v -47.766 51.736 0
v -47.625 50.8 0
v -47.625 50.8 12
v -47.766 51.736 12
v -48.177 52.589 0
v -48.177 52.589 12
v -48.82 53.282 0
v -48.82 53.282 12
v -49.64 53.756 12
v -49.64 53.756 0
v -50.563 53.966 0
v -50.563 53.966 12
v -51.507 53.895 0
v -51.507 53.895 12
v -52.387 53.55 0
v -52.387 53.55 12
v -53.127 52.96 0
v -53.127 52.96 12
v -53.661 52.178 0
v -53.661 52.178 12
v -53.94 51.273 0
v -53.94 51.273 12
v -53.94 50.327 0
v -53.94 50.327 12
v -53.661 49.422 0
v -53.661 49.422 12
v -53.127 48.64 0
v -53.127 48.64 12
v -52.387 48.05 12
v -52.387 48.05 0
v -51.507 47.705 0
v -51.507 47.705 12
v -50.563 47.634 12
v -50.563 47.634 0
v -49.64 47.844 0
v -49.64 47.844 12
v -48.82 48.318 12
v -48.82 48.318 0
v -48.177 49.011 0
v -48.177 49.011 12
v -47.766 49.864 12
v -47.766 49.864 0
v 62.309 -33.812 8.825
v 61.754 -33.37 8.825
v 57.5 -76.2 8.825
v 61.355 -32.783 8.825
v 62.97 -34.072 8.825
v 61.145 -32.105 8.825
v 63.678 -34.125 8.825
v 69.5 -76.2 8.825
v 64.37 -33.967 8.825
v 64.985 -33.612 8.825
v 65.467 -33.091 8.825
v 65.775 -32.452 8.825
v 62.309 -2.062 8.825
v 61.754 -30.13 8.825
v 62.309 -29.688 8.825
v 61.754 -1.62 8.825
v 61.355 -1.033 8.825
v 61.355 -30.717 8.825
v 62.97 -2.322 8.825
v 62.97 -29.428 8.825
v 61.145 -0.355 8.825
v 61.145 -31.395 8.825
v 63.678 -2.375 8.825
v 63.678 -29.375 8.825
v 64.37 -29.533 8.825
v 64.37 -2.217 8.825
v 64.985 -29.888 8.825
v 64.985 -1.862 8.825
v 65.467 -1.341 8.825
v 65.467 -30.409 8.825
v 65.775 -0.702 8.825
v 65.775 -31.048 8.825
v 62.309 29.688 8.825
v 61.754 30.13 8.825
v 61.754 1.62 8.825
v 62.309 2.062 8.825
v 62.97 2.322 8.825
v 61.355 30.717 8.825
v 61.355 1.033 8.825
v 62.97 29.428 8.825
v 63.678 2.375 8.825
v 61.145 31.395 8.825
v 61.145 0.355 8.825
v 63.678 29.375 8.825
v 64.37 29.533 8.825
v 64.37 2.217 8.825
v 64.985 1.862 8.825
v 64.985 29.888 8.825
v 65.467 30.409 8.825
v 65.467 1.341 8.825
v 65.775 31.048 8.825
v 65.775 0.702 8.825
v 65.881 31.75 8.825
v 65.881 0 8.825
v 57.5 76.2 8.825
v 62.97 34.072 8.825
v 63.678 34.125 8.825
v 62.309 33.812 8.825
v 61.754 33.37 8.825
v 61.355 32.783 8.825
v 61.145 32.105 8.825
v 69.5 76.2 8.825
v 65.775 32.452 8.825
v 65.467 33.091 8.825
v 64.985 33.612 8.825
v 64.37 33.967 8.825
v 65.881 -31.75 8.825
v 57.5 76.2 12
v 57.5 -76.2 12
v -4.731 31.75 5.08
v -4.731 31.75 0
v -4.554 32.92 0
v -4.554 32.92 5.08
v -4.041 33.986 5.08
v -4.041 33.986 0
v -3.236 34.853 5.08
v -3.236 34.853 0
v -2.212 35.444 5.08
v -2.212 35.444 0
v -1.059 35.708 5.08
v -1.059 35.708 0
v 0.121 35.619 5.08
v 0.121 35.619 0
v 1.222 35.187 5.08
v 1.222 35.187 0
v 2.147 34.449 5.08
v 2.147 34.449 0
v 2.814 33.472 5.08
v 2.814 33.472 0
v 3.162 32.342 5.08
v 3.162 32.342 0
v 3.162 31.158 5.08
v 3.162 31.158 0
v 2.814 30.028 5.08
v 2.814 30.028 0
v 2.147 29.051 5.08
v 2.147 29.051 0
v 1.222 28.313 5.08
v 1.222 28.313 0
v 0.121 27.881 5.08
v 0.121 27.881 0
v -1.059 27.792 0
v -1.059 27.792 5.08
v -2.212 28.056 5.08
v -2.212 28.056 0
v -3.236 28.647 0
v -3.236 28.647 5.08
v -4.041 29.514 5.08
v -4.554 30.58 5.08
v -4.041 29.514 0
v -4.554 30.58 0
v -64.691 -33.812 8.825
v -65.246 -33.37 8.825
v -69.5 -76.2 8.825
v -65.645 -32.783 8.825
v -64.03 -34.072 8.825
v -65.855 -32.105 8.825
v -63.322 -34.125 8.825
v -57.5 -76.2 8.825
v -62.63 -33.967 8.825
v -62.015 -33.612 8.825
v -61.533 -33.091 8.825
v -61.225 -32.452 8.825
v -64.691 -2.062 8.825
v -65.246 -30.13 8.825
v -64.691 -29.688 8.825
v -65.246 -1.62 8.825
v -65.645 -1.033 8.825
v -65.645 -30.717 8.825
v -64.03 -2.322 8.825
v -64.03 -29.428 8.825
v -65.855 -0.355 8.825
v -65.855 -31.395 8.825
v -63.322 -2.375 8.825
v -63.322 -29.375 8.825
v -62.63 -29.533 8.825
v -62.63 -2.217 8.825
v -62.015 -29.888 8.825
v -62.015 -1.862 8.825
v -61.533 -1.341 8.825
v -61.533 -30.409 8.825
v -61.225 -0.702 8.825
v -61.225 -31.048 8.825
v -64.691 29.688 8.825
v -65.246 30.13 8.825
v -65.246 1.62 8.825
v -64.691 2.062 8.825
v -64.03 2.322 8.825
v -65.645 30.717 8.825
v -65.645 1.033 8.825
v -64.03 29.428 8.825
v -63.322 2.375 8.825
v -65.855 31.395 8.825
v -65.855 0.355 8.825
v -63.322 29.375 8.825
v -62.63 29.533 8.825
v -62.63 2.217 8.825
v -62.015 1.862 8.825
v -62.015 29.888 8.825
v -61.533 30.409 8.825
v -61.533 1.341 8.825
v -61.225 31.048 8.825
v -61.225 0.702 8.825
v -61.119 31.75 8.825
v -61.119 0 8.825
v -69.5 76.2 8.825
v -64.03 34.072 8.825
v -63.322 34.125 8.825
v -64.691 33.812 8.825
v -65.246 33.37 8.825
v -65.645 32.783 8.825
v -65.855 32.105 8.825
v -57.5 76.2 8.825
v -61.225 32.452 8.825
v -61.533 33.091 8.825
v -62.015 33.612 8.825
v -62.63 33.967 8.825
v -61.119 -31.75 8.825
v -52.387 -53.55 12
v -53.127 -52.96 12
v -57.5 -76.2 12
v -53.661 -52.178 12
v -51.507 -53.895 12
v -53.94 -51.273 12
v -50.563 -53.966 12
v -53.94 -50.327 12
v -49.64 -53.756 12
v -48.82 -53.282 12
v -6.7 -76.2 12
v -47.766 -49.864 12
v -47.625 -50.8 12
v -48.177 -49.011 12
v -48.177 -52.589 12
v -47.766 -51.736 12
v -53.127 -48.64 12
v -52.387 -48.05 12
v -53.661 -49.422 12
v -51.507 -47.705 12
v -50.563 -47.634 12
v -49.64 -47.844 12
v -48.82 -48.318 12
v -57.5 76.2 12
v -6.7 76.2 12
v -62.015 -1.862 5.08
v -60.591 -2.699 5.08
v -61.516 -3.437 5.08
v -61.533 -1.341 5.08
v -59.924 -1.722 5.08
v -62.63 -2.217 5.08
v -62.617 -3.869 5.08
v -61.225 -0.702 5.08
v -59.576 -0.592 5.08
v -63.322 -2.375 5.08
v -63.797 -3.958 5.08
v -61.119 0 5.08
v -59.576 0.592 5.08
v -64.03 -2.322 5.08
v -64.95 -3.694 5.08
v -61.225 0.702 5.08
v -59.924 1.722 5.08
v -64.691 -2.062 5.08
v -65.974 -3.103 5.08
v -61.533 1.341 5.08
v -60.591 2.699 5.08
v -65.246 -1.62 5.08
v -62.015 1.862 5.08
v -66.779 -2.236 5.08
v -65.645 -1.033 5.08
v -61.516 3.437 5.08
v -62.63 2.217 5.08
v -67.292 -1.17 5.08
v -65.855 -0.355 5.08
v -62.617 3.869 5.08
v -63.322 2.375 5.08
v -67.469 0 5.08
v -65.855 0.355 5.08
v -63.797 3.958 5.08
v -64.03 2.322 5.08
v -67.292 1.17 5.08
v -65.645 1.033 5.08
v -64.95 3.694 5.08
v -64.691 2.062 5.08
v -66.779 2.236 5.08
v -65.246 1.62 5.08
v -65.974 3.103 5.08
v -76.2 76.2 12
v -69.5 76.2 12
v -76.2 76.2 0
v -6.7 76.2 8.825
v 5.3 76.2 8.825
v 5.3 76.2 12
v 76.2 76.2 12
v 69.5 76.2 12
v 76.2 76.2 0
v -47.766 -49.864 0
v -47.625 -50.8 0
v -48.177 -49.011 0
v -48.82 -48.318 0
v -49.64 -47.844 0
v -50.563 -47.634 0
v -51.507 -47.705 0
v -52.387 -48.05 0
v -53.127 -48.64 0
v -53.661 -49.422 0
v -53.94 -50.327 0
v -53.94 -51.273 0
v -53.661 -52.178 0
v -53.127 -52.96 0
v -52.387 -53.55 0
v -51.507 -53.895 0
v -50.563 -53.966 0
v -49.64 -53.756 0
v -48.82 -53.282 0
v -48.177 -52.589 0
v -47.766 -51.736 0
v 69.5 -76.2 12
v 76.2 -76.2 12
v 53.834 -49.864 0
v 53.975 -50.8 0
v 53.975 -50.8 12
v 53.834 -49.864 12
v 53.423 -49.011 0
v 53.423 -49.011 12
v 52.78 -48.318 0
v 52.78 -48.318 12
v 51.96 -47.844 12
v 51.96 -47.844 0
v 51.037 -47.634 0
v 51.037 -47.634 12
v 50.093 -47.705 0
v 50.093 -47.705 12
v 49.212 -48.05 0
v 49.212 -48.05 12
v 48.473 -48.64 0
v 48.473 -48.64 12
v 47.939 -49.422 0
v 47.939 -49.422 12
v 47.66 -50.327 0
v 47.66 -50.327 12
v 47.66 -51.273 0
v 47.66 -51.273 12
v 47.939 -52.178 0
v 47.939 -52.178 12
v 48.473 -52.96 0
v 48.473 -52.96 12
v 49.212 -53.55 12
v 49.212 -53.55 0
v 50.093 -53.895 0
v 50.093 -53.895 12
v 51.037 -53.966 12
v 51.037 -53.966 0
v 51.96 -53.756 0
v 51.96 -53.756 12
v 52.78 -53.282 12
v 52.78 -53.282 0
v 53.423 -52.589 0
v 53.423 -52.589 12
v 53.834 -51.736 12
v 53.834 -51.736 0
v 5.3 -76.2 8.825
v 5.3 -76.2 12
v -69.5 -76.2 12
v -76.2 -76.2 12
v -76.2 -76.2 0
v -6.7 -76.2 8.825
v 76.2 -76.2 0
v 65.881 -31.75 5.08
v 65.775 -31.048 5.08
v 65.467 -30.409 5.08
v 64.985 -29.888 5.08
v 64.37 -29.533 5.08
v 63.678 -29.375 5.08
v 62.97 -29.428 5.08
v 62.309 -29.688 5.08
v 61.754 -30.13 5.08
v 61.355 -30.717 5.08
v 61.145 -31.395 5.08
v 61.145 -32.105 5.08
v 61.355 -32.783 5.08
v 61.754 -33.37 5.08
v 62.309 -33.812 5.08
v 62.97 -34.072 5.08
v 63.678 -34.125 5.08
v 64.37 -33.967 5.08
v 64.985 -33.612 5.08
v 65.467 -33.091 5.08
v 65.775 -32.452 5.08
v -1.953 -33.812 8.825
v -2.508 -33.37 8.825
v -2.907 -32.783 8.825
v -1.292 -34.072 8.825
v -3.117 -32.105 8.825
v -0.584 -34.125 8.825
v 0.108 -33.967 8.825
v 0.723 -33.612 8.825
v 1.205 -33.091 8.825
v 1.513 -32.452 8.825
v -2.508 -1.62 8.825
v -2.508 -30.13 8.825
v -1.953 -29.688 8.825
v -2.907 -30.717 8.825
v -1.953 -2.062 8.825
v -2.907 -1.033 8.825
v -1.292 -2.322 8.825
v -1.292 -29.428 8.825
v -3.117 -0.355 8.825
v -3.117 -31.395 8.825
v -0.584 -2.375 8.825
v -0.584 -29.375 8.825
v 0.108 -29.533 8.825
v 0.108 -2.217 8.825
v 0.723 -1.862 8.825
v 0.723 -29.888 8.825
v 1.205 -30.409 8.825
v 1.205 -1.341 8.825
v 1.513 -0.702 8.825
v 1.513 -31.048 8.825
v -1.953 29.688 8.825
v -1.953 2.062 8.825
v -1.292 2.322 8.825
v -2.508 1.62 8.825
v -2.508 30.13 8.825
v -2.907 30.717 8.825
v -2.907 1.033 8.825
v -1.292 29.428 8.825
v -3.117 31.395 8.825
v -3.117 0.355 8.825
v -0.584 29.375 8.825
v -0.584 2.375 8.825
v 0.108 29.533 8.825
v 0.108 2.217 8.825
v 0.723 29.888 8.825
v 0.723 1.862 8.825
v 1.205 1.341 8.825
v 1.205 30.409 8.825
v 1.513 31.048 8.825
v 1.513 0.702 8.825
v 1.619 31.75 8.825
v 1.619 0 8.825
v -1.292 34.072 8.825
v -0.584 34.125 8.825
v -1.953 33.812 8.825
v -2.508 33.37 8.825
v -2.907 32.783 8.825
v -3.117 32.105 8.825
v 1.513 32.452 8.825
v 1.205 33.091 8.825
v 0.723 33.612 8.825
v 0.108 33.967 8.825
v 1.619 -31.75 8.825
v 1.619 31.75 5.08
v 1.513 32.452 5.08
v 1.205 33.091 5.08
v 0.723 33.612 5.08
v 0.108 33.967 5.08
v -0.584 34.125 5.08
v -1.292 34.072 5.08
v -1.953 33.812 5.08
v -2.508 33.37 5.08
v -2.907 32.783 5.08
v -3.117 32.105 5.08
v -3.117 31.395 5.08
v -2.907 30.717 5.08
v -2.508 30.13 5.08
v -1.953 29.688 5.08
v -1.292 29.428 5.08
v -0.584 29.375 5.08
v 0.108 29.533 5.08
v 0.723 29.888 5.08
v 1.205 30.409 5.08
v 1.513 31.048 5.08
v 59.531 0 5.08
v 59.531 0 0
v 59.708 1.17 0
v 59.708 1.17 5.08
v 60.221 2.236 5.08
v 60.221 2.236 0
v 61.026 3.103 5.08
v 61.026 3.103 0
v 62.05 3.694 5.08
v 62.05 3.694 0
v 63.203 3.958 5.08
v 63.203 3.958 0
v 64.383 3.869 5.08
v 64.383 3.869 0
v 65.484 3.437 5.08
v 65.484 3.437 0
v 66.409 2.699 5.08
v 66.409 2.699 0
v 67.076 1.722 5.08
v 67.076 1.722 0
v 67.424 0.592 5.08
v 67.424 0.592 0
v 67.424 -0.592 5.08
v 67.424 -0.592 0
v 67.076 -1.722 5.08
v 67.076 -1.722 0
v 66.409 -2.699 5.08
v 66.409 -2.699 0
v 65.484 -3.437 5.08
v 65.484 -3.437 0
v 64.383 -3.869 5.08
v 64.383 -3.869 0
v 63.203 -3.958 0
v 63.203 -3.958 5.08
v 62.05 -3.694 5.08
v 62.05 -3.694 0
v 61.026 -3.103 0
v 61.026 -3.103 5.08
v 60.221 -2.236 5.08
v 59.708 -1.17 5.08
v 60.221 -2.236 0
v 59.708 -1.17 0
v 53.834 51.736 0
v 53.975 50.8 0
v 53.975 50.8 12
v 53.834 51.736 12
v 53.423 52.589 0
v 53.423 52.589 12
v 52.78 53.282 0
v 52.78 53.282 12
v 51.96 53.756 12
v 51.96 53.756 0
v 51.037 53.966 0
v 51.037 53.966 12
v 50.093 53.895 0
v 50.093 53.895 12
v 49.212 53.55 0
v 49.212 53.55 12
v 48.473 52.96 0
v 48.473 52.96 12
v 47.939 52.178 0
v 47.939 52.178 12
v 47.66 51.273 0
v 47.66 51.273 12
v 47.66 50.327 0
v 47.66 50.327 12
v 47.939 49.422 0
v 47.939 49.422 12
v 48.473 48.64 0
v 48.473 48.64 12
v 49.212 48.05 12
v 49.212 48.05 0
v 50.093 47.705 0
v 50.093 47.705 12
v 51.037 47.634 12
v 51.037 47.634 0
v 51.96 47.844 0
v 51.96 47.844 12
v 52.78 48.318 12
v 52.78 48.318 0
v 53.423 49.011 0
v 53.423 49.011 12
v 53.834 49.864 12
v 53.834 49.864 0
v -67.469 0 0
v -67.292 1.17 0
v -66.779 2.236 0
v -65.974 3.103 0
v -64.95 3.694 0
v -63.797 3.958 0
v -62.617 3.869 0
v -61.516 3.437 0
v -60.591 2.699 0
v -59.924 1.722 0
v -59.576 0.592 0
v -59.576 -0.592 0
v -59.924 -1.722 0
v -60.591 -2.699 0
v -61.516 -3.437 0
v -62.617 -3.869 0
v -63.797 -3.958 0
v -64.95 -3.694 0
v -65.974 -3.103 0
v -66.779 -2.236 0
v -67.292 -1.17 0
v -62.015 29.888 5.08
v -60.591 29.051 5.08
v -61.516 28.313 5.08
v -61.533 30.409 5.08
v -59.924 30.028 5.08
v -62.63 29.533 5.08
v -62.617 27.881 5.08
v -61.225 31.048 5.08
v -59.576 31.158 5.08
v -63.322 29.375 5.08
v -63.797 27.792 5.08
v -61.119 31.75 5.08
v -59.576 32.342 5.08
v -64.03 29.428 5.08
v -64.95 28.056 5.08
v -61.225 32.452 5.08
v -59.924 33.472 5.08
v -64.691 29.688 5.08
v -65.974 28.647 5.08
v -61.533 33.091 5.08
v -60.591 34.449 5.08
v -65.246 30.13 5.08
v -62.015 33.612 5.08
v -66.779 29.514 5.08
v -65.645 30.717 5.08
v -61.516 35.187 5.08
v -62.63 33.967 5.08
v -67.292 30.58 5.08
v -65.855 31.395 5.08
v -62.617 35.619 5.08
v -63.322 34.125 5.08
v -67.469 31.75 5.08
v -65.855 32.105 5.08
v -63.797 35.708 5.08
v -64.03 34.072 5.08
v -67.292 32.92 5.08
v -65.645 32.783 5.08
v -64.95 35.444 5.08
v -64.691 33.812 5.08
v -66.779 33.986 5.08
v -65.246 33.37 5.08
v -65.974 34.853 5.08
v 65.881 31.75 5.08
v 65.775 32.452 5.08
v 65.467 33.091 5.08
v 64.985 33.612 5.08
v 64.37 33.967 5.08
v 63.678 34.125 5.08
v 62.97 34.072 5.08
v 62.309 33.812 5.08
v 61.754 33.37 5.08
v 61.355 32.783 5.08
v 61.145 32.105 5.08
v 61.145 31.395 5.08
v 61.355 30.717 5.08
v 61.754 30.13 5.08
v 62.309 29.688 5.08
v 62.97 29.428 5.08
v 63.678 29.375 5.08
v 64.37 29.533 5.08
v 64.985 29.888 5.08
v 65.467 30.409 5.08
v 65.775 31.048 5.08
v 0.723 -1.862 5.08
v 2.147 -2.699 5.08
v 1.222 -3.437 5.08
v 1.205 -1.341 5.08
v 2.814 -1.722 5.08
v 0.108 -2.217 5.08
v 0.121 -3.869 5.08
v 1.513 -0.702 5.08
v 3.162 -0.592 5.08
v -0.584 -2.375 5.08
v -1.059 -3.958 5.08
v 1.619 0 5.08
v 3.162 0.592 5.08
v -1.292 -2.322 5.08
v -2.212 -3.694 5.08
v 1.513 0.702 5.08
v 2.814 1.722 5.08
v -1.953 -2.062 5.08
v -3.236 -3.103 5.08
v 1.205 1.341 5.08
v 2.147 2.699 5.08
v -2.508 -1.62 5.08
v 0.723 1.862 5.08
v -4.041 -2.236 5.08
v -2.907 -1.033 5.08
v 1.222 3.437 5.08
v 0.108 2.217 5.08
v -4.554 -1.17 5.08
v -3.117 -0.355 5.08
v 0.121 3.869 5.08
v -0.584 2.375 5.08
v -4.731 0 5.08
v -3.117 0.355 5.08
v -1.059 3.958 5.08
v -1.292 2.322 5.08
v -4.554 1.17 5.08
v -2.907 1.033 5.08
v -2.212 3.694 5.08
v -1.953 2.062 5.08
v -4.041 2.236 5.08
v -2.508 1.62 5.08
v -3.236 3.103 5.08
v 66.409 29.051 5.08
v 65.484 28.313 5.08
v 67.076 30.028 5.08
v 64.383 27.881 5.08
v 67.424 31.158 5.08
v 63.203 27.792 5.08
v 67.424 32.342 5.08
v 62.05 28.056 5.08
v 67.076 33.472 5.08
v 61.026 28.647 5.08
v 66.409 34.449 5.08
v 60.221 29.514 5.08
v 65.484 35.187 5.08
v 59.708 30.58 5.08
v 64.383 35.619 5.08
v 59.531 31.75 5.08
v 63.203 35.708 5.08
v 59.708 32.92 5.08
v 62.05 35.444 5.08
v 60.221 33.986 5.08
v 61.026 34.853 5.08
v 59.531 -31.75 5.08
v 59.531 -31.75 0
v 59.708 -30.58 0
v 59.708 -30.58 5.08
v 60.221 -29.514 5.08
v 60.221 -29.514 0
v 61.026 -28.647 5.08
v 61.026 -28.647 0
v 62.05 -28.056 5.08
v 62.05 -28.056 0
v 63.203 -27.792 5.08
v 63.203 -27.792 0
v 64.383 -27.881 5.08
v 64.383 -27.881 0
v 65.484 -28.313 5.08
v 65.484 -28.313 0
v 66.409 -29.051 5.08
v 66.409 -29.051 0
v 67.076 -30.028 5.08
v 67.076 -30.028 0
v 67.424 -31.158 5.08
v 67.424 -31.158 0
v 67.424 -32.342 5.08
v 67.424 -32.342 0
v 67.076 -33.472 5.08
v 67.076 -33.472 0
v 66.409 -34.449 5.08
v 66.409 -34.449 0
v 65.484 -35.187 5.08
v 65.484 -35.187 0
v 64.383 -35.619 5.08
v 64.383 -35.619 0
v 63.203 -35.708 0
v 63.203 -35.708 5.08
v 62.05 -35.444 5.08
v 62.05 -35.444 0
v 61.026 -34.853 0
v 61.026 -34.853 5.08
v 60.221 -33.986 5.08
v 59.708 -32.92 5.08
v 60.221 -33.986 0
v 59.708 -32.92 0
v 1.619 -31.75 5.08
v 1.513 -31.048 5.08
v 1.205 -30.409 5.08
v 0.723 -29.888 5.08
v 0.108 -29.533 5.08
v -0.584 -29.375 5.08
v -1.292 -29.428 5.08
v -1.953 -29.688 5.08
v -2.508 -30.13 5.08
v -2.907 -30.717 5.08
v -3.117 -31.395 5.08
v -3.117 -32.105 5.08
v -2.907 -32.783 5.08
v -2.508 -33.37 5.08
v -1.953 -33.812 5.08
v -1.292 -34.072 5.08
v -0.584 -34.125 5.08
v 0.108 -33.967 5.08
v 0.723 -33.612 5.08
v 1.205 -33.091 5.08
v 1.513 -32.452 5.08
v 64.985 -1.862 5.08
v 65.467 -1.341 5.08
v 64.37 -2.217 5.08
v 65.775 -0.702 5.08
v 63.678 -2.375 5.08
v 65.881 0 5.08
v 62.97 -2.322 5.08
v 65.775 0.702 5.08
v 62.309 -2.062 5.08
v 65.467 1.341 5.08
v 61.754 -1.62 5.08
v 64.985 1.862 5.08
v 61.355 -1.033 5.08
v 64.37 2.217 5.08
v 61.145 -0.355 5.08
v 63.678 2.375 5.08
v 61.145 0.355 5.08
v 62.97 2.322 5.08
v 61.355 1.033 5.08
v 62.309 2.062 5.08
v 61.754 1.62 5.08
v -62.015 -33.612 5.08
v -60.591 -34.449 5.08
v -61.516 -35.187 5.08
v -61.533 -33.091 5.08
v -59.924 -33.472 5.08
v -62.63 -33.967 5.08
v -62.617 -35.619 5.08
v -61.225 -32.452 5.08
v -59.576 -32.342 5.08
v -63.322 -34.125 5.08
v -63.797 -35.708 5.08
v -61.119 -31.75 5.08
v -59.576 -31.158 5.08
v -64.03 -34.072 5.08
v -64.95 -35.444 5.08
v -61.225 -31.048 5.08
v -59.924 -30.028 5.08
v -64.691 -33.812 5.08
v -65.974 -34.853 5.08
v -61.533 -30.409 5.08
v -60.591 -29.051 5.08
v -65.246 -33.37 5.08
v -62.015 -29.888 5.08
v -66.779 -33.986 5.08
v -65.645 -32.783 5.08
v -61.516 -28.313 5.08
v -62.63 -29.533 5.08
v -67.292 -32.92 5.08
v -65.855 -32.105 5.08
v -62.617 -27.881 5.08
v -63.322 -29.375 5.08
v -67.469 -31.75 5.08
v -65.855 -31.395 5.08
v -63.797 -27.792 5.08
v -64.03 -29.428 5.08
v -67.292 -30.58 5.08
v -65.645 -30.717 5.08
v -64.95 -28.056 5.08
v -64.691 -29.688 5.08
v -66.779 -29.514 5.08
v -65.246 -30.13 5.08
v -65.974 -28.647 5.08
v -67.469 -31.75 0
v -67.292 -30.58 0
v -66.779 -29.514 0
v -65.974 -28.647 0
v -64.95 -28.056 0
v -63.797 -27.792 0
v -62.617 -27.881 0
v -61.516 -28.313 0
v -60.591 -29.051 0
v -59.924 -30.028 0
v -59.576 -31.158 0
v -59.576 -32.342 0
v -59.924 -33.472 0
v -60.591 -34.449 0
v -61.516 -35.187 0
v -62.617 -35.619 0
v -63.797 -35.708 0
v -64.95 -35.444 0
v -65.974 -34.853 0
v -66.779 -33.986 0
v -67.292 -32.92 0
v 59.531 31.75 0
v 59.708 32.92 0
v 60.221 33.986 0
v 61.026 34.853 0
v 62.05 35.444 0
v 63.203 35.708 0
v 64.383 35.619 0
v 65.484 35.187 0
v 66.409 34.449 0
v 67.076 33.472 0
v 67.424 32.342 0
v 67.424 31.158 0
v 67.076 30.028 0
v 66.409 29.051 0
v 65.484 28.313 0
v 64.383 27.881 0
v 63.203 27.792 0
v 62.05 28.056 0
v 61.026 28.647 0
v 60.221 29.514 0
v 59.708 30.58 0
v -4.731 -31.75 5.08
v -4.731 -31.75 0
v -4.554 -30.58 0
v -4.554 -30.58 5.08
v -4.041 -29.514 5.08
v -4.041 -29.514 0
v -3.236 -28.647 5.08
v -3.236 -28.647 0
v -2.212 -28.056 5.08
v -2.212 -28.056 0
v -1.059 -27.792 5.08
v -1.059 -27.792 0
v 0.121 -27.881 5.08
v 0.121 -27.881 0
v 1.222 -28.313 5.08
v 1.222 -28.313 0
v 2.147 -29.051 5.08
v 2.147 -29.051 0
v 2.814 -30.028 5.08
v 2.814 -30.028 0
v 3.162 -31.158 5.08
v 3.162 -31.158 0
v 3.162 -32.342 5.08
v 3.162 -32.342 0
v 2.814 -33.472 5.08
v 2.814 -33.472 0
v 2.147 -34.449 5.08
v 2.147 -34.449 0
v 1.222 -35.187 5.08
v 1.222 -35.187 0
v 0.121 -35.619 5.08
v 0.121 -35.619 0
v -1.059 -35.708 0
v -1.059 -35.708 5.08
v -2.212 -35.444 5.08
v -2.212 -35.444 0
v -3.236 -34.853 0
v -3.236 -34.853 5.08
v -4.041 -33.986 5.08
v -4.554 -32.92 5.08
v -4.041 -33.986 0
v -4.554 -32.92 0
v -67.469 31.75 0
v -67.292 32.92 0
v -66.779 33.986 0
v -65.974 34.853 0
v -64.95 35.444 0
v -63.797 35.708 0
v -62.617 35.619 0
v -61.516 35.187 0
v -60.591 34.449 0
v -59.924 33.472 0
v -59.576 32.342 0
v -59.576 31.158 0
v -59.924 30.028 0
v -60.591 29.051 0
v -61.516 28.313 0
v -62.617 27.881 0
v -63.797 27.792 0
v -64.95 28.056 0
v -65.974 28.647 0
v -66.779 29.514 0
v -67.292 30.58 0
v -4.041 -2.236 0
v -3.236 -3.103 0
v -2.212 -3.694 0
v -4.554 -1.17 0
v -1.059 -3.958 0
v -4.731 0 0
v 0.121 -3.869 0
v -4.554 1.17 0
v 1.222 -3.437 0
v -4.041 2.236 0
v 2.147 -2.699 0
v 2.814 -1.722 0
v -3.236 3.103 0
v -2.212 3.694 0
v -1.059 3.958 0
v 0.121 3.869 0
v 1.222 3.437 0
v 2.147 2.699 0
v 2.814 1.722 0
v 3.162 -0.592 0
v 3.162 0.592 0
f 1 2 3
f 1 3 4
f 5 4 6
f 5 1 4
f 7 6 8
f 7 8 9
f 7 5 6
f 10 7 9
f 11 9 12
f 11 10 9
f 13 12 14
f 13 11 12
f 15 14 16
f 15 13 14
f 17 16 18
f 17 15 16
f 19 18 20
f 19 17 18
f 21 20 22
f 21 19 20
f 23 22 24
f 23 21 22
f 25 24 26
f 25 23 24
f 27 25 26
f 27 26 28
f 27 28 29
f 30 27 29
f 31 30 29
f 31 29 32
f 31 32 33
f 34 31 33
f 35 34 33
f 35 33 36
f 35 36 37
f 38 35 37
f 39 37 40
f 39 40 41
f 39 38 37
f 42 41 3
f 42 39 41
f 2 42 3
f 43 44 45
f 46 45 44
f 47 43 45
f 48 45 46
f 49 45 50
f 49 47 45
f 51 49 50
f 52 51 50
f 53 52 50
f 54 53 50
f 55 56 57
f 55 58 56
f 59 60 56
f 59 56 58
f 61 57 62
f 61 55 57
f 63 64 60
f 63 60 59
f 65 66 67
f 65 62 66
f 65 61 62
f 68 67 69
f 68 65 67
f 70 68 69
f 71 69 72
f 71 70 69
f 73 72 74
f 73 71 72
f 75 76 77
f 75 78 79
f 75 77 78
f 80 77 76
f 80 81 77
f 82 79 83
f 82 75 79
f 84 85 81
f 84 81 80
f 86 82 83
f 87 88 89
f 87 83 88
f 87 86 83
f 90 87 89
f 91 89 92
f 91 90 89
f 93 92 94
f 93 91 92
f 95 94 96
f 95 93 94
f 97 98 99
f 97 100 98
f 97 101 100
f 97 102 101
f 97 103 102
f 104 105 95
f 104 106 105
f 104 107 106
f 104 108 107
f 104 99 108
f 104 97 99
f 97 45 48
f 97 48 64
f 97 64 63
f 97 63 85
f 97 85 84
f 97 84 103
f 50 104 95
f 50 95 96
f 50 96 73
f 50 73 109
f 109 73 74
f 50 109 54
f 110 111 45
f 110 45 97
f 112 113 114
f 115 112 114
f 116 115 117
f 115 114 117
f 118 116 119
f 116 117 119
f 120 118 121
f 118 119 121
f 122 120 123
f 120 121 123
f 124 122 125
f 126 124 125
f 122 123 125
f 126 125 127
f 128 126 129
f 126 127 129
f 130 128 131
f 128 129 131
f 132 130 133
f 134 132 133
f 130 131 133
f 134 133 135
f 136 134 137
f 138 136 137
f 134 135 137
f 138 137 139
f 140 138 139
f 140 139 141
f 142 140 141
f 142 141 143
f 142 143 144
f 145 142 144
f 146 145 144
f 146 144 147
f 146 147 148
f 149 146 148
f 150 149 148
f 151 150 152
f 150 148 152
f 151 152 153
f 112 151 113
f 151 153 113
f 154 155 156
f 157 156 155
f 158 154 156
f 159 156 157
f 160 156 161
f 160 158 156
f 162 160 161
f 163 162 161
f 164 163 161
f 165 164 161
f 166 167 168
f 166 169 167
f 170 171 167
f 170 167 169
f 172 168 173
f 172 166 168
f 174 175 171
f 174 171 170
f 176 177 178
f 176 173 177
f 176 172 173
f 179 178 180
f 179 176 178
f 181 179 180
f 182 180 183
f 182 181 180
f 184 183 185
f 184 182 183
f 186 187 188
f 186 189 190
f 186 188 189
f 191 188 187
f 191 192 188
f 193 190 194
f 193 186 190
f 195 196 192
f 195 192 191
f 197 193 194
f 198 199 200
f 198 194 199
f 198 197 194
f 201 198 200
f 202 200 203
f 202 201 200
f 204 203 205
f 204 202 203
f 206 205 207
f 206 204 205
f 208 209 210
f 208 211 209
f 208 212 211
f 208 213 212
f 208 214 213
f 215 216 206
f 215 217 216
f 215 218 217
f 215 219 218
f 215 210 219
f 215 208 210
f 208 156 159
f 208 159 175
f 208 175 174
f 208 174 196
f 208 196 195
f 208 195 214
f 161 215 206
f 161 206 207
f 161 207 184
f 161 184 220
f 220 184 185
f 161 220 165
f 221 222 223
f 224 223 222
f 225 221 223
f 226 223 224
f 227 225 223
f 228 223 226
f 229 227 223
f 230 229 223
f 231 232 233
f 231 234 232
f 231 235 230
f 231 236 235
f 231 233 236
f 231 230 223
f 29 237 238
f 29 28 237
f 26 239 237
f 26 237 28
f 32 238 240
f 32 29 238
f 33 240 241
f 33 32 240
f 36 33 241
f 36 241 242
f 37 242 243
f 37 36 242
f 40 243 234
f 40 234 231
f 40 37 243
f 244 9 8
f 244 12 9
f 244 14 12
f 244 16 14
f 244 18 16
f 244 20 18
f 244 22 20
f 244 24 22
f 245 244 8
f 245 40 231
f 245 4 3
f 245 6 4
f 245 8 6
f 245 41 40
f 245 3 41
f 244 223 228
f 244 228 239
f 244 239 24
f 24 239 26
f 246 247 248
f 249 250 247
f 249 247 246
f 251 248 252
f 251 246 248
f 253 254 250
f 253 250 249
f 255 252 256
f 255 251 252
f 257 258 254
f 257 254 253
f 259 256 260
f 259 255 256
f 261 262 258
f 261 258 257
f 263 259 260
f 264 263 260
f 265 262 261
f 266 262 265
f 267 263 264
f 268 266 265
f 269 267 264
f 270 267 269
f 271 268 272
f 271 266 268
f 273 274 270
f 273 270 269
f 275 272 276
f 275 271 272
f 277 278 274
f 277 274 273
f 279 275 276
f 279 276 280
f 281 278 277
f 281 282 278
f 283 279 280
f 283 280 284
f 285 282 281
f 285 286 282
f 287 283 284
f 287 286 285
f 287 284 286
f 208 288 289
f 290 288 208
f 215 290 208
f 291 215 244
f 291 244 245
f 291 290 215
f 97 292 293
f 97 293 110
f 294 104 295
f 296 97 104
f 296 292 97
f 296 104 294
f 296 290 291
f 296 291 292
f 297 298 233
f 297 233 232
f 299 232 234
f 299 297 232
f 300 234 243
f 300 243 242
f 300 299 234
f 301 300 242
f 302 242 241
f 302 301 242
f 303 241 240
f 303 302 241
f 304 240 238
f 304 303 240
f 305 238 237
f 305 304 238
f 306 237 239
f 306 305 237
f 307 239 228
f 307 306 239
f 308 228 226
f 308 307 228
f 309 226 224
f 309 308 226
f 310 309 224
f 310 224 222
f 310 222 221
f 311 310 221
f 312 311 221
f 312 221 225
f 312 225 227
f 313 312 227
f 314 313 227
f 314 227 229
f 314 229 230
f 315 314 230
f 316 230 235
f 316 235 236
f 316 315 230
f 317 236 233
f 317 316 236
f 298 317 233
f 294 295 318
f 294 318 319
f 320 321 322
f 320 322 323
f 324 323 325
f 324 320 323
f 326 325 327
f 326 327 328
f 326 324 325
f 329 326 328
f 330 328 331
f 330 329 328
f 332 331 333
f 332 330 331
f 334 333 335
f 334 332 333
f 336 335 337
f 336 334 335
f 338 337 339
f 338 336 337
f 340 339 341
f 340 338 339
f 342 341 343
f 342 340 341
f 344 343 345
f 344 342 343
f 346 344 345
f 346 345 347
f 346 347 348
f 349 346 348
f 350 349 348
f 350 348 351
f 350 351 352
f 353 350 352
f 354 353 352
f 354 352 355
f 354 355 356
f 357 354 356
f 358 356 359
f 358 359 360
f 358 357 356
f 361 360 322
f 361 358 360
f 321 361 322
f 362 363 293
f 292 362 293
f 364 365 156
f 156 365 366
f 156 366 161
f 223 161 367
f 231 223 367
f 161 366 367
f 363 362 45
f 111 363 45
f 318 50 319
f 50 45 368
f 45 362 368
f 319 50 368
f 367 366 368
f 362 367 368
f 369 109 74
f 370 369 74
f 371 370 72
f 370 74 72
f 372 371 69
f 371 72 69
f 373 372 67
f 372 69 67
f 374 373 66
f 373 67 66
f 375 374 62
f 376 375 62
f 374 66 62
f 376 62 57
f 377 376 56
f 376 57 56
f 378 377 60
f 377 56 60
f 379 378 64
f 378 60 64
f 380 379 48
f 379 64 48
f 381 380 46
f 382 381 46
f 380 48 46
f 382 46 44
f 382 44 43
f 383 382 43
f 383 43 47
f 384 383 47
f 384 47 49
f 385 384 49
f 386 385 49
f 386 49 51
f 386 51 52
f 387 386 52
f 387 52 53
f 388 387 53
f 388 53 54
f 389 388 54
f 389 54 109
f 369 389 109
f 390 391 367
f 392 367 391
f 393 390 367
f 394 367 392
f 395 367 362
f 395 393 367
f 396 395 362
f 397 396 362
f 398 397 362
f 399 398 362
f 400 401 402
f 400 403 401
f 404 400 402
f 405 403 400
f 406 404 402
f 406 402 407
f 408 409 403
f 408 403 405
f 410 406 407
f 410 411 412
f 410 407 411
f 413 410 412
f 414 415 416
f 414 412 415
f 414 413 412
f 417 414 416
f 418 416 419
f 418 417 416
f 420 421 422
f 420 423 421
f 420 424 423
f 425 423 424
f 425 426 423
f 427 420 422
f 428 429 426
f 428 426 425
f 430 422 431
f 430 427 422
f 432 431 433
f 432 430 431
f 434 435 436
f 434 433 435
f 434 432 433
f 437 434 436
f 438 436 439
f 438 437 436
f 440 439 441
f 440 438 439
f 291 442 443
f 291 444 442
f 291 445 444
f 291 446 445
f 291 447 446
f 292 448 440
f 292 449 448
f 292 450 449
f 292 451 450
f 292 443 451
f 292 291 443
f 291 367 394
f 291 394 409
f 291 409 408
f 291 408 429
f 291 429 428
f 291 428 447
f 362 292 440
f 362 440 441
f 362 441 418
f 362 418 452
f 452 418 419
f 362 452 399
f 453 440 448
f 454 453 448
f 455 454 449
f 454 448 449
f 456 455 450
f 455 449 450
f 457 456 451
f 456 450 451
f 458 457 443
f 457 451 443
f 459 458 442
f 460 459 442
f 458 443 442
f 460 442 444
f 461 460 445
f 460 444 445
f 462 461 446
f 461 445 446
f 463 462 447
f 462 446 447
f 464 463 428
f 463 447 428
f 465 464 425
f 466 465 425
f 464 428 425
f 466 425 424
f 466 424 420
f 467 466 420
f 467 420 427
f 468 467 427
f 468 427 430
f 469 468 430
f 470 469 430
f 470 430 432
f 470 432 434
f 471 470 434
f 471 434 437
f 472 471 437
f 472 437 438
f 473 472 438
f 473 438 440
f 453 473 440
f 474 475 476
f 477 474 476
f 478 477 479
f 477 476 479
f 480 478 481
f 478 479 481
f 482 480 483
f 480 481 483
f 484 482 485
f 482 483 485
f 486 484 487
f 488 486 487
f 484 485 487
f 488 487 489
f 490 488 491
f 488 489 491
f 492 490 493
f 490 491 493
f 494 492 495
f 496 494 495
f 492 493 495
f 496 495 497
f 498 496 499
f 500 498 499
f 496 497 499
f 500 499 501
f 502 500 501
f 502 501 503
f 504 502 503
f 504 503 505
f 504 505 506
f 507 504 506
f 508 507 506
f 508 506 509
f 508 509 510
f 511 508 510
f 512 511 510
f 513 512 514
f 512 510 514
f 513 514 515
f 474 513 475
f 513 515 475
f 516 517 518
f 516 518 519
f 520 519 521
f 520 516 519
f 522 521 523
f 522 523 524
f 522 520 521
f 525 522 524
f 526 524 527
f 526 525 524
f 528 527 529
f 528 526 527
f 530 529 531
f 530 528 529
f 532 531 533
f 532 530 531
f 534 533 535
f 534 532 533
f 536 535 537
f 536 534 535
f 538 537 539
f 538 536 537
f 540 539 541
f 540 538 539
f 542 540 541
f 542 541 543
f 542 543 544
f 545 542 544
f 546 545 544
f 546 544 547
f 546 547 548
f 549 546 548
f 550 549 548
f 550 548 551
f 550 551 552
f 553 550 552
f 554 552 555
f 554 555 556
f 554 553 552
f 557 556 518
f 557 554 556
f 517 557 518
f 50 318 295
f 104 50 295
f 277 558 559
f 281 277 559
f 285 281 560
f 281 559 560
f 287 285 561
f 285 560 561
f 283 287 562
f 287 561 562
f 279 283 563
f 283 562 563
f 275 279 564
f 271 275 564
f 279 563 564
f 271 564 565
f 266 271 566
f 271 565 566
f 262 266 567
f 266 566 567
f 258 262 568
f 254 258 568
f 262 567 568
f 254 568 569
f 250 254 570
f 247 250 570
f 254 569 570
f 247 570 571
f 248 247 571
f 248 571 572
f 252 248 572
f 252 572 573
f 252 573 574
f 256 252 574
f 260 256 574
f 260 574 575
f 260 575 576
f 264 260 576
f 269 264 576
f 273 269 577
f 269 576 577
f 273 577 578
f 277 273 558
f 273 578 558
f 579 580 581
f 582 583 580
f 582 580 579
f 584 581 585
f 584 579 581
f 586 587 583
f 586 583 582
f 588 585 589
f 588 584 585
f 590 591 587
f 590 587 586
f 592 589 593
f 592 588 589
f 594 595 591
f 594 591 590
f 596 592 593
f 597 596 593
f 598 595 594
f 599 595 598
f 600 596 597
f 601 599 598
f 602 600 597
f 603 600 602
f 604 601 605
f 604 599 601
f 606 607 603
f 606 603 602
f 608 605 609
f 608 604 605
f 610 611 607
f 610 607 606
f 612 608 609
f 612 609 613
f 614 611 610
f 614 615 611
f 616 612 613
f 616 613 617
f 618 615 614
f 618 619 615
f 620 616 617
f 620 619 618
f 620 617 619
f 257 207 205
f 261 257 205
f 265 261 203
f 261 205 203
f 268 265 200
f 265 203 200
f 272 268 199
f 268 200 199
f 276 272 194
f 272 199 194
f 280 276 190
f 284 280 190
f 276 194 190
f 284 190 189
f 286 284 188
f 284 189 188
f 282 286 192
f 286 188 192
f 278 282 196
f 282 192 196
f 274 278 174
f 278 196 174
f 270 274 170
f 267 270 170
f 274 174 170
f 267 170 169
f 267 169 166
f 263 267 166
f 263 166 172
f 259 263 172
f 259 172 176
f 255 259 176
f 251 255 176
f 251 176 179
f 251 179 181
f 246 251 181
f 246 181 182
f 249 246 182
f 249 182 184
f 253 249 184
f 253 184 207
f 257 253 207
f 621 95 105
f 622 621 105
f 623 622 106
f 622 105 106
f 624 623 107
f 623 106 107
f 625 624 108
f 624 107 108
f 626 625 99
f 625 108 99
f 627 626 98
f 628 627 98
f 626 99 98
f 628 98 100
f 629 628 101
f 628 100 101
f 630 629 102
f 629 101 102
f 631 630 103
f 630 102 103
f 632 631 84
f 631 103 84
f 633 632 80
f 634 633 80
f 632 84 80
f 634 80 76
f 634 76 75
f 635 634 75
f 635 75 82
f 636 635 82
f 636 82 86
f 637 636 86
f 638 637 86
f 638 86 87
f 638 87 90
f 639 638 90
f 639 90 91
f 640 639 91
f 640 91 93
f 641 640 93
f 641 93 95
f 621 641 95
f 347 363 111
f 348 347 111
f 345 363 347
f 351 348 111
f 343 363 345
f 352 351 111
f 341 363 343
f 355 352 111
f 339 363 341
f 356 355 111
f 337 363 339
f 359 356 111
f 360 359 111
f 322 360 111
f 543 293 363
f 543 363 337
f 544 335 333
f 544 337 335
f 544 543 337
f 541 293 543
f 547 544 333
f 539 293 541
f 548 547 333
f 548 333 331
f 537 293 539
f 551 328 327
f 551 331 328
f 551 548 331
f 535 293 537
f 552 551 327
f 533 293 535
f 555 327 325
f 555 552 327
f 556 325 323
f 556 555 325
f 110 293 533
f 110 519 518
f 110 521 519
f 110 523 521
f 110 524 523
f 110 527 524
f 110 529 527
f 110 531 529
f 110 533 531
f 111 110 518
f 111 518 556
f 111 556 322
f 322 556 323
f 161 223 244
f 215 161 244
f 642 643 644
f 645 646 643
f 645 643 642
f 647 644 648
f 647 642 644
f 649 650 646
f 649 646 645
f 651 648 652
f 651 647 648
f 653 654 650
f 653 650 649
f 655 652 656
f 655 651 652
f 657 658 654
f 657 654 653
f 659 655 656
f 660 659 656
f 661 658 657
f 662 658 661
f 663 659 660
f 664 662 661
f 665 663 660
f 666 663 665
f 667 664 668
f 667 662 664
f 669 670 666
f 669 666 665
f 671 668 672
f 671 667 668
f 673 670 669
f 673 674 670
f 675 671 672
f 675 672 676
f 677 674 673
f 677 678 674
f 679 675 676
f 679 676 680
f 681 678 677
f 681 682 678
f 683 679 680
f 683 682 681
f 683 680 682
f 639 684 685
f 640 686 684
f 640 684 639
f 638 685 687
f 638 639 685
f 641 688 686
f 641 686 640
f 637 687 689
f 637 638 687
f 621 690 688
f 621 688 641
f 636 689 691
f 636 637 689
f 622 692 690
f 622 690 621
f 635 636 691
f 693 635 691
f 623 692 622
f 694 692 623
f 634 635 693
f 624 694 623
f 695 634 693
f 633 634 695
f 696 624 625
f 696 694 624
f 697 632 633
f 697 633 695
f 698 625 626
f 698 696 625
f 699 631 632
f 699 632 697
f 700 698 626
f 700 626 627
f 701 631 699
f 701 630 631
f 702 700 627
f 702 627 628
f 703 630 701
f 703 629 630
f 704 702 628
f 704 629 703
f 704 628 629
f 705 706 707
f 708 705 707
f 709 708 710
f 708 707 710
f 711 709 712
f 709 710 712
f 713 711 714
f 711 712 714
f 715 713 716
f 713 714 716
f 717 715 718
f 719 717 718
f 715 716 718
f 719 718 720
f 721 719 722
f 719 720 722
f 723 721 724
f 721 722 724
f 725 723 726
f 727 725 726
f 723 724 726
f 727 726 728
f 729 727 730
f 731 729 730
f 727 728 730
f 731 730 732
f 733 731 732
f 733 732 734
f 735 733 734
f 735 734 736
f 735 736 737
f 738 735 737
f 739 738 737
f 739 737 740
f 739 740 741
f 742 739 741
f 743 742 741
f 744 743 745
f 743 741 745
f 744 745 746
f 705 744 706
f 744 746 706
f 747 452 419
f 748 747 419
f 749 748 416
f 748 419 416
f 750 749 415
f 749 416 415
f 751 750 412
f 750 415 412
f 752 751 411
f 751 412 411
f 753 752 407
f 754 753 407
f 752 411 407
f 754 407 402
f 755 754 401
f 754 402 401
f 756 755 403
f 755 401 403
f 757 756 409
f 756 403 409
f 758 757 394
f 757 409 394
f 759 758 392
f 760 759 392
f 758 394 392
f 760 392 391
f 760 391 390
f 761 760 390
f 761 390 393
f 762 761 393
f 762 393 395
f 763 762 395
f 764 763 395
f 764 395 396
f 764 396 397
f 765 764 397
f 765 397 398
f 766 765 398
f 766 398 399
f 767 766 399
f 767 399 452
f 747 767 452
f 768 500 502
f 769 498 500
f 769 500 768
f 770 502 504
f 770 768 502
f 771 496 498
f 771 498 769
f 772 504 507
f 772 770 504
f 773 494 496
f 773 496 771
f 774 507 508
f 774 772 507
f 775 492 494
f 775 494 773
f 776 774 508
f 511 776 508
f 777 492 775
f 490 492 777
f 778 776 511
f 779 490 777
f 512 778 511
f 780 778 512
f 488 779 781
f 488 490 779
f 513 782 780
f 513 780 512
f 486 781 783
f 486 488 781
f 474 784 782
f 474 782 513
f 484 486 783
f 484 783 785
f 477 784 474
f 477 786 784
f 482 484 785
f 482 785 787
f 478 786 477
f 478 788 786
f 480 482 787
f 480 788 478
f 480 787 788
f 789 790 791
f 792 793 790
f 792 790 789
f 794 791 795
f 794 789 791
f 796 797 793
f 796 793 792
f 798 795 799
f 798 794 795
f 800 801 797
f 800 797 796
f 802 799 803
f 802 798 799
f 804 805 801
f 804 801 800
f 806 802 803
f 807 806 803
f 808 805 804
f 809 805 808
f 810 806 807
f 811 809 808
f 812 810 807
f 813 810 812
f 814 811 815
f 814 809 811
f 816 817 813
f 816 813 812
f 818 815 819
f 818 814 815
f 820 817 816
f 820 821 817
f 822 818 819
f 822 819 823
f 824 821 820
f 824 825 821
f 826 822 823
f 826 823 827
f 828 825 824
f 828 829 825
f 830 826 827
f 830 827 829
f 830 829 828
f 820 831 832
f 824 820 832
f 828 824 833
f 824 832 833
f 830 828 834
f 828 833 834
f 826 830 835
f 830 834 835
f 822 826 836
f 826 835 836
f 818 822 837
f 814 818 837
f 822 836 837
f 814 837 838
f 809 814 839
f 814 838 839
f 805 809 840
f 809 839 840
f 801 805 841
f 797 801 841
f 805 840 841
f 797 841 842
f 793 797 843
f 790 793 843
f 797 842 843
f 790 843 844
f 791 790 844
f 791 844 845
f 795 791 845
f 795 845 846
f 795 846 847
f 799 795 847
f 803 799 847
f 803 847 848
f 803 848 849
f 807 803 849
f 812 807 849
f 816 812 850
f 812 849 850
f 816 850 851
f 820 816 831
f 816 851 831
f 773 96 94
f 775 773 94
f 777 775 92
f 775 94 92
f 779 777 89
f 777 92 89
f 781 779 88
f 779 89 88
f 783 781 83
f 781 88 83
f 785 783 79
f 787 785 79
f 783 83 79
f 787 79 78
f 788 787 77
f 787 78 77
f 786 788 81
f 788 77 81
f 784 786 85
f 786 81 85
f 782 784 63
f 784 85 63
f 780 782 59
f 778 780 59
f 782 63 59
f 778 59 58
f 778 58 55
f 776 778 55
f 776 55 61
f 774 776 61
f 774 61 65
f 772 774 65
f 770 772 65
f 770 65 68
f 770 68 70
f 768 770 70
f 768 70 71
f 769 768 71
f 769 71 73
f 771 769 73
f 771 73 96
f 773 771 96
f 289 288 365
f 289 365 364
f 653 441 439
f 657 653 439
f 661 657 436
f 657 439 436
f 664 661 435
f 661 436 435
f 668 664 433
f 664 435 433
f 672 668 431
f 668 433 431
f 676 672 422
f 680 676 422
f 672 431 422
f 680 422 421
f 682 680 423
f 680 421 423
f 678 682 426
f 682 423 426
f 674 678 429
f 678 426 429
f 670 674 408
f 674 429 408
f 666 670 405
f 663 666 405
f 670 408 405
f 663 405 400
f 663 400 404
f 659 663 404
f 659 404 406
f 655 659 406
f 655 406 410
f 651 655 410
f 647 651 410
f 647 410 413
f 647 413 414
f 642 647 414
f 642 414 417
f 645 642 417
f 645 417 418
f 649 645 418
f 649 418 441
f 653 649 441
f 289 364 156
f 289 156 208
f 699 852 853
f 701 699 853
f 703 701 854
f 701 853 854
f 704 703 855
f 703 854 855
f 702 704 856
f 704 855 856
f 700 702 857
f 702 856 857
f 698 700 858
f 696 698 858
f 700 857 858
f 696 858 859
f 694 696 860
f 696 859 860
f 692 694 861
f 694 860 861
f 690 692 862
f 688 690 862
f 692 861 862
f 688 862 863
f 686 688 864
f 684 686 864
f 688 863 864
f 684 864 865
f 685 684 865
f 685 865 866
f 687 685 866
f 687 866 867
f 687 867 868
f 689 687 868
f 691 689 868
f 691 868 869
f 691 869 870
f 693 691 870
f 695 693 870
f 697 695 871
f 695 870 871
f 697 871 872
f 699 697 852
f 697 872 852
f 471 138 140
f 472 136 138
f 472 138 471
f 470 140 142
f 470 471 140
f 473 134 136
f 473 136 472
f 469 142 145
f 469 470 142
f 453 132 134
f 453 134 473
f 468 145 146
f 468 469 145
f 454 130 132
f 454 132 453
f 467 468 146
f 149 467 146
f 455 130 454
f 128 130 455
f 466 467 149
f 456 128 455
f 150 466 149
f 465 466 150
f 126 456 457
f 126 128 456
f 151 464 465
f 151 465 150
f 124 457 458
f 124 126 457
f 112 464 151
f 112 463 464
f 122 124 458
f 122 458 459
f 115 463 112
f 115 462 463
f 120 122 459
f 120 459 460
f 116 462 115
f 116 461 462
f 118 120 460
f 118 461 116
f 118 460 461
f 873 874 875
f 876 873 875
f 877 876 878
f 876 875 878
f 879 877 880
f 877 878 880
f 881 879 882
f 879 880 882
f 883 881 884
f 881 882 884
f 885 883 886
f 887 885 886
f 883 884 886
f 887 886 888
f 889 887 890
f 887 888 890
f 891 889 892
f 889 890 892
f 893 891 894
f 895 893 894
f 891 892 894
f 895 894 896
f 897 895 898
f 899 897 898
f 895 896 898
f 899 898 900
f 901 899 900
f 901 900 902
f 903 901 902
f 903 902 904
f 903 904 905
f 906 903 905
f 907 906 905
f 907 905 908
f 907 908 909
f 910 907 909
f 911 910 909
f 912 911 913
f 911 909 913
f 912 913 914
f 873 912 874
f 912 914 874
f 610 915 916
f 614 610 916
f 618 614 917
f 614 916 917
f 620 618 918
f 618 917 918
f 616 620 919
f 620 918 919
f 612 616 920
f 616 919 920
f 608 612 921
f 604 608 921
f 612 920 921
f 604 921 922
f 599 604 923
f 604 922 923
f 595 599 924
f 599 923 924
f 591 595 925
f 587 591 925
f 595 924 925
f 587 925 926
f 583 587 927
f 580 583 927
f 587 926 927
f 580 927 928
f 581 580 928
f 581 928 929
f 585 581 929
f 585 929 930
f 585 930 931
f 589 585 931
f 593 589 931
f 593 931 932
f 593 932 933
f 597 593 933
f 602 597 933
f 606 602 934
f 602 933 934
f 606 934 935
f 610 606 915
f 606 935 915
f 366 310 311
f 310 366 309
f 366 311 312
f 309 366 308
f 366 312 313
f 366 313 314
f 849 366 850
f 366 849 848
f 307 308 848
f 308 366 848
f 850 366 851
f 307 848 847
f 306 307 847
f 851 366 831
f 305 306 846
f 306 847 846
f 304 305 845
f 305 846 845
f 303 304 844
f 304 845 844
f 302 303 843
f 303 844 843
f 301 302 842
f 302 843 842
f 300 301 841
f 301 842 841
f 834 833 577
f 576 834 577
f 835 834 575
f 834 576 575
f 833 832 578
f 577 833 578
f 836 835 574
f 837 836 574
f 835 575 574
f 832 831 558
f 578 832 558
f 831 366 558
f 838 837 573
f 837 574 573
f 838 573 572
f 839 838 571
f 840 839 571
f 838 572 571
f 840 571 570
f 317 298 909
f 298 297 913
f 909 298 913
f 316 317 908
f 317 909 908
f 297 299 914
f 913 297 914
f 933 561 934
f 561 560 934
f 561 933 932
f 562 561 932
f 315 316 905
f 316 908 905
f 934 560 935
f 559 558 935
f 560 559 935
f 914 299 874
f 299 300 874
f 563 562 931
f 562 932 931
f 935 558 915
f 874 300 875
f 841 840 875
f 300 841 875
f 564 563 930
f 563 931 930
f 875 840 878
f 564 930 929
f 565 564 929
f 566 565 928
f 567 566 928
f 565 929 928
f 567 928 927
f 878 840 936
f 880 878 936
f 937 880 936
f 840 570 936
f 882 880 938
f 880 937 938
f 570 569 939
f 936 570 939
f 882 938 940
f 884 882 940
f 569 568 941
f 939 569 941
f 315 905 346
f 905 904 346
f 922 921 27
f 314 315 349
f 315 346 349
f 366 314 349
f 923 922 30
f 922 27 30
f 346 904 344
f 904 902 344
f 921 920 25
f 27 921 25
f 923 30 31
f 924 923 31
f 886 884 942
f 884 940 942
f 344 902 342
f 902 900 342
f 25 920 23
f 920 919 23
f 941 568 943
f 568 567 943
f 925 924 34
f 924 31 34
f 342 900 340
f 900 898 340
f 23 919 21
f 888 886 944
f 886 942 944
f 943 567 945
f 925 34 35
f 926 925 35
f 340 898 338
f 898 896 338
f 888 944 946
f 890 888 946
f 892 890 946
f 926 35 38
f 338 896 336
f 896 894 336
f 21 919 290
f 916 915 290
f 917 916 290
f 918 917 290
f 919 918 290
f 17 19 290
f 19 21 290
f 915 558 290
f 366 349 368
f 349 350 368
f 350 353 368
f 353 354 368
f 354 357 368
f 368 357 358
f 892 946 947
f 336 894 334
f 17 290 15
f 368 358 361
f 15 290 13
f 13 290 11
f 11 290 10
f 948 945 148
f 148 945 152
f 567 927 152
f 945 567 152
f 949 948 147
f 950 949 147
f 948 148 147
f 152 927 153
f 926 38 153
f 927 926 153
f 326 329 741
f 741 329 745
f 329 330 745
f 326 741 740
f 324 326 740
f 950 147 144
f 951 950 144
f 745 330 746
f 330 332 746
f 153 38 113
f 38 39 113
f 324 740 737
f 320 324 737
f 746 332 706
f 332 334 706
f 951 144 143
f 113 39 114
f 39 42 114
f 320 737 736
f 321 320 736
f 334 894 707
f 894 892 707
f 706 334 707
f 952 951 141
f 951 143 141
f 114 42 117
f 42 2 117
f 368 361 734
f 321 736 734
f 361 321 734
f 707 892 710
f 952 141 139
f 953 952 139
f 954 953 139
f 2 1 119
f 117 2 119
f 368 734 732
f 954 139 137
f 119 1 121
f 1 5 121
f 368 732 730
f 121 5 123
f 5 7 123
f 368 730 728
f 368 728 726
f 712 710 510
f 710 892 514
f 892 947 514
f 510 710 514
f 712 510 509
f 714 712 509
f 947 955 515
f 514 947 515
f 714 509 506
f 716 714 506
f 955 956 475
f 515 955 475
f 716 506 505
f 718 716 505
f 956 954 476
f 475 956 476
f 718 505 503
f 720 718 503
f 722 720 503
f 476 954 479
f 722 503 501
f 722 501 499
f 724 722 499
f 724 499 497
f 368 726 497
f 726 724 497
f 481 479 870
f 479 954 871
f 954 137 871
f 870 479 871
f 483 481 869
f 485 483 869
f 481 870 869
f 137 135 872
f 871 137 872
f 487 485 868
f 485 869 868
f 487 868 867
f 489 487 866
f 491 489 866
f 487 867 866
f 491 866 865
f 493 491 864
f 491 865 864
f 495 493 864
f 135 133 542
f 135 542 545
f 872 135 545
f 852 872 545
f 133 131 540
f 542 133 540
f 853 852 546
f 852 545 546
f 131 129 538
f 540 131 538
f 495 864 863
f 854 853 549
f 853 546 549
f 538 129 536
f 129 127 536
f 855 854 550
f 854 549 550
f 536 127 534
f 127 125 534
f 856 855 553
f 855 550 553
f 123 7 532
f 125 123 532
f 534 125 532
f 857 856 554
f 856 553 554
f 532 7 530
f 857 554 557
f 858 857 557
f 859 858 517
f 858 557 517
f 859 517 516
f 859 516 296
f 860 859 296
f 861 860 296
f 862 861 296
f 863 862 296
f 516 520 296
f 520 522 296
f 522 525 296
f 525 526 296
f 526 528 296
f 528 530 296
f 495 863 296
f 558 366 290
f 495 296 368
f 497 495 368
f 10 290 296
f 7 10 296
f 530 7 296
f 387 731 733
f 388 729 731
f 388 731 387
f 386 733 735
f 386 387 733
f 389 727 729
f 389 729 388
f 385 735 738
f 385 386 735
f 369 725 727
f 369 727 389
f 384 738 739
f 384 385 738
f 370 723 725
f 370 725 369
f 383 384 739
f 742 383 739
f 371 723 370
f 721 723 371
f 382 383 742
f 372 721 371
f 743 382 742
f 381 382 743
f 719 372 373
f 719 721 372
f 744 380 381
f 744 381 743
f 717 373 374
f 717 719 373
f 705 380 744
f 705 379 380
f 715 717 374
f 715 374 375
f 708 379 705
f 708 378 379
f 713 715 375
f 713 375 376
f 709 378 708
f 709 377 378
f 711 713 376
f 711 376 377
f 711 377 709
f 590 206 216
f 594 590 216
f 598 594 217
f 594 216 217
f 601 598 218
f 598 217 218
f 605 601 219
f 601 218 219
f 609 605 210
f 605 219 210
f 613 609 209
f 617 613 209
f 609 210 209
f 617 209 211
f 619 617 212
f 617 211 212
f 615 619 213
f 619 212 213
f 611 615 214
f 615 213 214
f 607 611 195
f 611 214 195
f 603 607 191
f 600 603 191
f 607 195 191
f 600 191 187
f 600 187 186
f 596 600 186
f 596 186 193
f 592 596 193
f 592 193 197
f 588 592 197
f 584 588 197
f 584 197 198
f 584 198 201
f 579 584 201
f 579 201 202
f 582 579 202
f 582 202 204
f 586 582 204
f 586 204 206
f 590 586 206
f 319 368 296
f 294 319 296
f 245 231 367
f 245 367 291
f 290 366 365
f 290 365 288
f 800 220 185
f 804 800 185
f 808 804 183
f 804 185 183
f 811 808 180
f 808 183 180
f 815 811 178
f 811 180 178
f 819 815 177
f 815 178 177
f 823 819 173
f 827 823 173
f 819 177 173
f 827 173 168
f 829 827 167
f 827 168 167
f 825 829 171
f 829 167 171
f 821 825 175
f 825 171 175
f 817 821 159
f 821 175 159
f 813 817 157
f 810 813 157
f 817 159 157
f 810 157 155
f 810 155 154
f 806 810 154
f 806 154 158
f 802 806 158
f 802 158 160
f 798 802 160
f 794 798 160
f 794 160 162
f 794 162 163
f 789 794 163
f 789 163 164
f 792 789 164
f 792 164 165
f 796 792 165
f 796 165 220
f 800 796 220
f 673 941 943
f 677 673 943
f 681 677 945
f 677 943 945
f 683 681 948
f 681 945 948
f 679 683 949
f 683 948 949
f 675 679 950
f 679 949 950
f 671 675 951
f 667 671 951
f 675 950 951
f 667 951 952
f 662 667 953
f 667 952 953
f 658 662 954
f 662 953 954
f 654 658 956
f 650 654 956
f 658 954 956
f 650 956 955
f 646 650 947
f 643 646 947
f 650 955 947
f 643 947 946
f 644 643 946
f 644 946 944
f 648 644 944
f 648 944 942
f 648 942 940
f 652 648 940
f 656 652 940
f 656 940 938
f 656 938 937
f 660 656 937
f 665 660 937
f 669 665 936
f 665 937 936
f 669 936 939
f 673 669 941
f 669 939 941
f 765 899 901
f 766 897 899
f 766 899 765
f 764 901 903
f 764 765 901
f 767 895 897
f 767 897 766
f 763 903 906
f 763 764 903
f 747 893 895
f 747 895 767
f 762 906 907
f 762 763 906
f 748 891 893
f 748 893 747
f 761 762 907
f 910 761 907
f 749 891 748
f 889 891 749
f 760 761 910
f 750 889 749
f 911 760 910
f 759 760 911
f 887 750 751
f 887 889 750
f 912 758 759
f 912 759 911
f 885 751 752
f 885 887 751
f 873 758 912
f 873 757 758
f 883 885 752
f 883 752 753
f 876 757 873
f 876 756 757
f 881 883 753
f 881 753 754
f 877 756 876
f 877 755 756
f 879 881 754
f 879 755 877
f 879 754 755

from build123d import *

# Parameters (mm, degrees)
SKETCH1_W           = 152.4
SKETCH1_H           = 152.4
SKETCH1_R           = 3.175
BOSS_EXTRUDE1_DEPTH = 12.0000014
SKETCH2_W           = 12.0000014
SKETCH2_H           = 152.4
CUT_EXTRUDE1_DEPTH  = 3.175
SKETCH3_R           = 2.38125
CUT_EXTRUDE2_DEPTH  = 109.123820917
SKETCH4_R           = 3.96875
CUT_EXTRUDE3_DEPTH  = 5.08
LPATTERN1_COUNT     = 2
LPATTERN1_PITCH     = 62.738
LPATTERN2_COUNT     = 2
LPATTERN2_PITCH     = 127


with BuildPart() as part:
    # Sketch1 → Boss-Extrude1 (new body)
    with BuildSketch(Plane.XY):
        Rectangle(SKETCH1_W, SKETCH1_H)
        with Locations((-50.8, 50.8)):
            Circle(SKETCH1_R, mode=Mode.SUBTRACT)
        with Locations((50.8, 50.8)):
            Circle(SKETCH1_R, mode=Mode.SUBTRACT)
        with Locations((50.8, -50.8)):
            Circle(SKETCH1_R, mode=Mode.SUBTRACT)
        with Locations((-50.8, -50.8)):
            Circle(SKETCH1_R, mode=Mode.SUBTRACT)
    extrude(amount=BOSS_EXTRUDE1_DEPTH)

    # Sketch2 → Cut-Extrude1 (cut)
    with BuildSketch(Plane.XY.offset(12.0000014)):
        with Locations((-63.5, 0)):
            Rectangle(SKETCH2_W, SKETCH2_H)
        with Locations((-0.6999986, 0)):
            Rectangle(SKETCH2_W, SKETCH2_H)
        with Locations((63.5, 0)):
            Rectangle(SKETCH2_W, SKETCH2_H)
    extrude(amount=-CUT_EXTRUDE1_DEPTH, mode=Mode.SUBTRACT)

    # Sketch3 → Cut-Extrude2 (cut, through all)
    with BuildSketch(Plane.XY.offset(8.8250014)):
        with Locations((-63.5, 0)):
            Circle(SKETCH3_R)
        with Locations((-63.5, 31.75)):
            Circle(SKETCH3_R)
        with Locations((-63.5, -31.75)):
            Circle(SKETCH3_R)
    cut_extrude2 = extrude(amount=-CUT_EXTRUDE2_DEPTH, mode=Mode.SUBTRACT)

    # Sketch4 → Cut-Extrude3 (cut)
    with BuildSketch(Plane(origin=(0, 0, 0), x_dir=(-1, 0, 0), z_dir=(0, 0, -1))):
        with Locations((63.5, 31.75)):
            Circle(SKETCH4_R)
        with Locations((63.5, 0)):
            Circle(SKETCH4_R)
        with Locations((63.5, -31.75)):
            Circle(SKETCH4_R)
    cut_extrude3 = extrude(amount=-CUT_EXTRUDE3_DEPTH, mode=Mode.SUBTRACT)

    # LPattern1: Cut-Extrude2, Cut-Extrude3 ×2
    with Locations(*[(i * LPATTERN1_PITCH, 0, 0) for i in range(1, LPATTERN1_COUNT)]):
        add(cut_extrude2, mode=Mode.SUBTRACT)
        add(cut_extrude3, mode=Mode.SUBTRACT)

    # LPattern2: Cut-Extrude2, Cut-Extrude3 ×2
    with Locations(*[(i * LPATTERN2_PITCH, 0, 0) for i in range(1, LPATTERN2_COUNT)]):
        add(cut_extrude2, mode=Mode.SUBTRACT)
        add(cut_extrude3, mode=Mode.SUBTRACT)


solid = part.part
